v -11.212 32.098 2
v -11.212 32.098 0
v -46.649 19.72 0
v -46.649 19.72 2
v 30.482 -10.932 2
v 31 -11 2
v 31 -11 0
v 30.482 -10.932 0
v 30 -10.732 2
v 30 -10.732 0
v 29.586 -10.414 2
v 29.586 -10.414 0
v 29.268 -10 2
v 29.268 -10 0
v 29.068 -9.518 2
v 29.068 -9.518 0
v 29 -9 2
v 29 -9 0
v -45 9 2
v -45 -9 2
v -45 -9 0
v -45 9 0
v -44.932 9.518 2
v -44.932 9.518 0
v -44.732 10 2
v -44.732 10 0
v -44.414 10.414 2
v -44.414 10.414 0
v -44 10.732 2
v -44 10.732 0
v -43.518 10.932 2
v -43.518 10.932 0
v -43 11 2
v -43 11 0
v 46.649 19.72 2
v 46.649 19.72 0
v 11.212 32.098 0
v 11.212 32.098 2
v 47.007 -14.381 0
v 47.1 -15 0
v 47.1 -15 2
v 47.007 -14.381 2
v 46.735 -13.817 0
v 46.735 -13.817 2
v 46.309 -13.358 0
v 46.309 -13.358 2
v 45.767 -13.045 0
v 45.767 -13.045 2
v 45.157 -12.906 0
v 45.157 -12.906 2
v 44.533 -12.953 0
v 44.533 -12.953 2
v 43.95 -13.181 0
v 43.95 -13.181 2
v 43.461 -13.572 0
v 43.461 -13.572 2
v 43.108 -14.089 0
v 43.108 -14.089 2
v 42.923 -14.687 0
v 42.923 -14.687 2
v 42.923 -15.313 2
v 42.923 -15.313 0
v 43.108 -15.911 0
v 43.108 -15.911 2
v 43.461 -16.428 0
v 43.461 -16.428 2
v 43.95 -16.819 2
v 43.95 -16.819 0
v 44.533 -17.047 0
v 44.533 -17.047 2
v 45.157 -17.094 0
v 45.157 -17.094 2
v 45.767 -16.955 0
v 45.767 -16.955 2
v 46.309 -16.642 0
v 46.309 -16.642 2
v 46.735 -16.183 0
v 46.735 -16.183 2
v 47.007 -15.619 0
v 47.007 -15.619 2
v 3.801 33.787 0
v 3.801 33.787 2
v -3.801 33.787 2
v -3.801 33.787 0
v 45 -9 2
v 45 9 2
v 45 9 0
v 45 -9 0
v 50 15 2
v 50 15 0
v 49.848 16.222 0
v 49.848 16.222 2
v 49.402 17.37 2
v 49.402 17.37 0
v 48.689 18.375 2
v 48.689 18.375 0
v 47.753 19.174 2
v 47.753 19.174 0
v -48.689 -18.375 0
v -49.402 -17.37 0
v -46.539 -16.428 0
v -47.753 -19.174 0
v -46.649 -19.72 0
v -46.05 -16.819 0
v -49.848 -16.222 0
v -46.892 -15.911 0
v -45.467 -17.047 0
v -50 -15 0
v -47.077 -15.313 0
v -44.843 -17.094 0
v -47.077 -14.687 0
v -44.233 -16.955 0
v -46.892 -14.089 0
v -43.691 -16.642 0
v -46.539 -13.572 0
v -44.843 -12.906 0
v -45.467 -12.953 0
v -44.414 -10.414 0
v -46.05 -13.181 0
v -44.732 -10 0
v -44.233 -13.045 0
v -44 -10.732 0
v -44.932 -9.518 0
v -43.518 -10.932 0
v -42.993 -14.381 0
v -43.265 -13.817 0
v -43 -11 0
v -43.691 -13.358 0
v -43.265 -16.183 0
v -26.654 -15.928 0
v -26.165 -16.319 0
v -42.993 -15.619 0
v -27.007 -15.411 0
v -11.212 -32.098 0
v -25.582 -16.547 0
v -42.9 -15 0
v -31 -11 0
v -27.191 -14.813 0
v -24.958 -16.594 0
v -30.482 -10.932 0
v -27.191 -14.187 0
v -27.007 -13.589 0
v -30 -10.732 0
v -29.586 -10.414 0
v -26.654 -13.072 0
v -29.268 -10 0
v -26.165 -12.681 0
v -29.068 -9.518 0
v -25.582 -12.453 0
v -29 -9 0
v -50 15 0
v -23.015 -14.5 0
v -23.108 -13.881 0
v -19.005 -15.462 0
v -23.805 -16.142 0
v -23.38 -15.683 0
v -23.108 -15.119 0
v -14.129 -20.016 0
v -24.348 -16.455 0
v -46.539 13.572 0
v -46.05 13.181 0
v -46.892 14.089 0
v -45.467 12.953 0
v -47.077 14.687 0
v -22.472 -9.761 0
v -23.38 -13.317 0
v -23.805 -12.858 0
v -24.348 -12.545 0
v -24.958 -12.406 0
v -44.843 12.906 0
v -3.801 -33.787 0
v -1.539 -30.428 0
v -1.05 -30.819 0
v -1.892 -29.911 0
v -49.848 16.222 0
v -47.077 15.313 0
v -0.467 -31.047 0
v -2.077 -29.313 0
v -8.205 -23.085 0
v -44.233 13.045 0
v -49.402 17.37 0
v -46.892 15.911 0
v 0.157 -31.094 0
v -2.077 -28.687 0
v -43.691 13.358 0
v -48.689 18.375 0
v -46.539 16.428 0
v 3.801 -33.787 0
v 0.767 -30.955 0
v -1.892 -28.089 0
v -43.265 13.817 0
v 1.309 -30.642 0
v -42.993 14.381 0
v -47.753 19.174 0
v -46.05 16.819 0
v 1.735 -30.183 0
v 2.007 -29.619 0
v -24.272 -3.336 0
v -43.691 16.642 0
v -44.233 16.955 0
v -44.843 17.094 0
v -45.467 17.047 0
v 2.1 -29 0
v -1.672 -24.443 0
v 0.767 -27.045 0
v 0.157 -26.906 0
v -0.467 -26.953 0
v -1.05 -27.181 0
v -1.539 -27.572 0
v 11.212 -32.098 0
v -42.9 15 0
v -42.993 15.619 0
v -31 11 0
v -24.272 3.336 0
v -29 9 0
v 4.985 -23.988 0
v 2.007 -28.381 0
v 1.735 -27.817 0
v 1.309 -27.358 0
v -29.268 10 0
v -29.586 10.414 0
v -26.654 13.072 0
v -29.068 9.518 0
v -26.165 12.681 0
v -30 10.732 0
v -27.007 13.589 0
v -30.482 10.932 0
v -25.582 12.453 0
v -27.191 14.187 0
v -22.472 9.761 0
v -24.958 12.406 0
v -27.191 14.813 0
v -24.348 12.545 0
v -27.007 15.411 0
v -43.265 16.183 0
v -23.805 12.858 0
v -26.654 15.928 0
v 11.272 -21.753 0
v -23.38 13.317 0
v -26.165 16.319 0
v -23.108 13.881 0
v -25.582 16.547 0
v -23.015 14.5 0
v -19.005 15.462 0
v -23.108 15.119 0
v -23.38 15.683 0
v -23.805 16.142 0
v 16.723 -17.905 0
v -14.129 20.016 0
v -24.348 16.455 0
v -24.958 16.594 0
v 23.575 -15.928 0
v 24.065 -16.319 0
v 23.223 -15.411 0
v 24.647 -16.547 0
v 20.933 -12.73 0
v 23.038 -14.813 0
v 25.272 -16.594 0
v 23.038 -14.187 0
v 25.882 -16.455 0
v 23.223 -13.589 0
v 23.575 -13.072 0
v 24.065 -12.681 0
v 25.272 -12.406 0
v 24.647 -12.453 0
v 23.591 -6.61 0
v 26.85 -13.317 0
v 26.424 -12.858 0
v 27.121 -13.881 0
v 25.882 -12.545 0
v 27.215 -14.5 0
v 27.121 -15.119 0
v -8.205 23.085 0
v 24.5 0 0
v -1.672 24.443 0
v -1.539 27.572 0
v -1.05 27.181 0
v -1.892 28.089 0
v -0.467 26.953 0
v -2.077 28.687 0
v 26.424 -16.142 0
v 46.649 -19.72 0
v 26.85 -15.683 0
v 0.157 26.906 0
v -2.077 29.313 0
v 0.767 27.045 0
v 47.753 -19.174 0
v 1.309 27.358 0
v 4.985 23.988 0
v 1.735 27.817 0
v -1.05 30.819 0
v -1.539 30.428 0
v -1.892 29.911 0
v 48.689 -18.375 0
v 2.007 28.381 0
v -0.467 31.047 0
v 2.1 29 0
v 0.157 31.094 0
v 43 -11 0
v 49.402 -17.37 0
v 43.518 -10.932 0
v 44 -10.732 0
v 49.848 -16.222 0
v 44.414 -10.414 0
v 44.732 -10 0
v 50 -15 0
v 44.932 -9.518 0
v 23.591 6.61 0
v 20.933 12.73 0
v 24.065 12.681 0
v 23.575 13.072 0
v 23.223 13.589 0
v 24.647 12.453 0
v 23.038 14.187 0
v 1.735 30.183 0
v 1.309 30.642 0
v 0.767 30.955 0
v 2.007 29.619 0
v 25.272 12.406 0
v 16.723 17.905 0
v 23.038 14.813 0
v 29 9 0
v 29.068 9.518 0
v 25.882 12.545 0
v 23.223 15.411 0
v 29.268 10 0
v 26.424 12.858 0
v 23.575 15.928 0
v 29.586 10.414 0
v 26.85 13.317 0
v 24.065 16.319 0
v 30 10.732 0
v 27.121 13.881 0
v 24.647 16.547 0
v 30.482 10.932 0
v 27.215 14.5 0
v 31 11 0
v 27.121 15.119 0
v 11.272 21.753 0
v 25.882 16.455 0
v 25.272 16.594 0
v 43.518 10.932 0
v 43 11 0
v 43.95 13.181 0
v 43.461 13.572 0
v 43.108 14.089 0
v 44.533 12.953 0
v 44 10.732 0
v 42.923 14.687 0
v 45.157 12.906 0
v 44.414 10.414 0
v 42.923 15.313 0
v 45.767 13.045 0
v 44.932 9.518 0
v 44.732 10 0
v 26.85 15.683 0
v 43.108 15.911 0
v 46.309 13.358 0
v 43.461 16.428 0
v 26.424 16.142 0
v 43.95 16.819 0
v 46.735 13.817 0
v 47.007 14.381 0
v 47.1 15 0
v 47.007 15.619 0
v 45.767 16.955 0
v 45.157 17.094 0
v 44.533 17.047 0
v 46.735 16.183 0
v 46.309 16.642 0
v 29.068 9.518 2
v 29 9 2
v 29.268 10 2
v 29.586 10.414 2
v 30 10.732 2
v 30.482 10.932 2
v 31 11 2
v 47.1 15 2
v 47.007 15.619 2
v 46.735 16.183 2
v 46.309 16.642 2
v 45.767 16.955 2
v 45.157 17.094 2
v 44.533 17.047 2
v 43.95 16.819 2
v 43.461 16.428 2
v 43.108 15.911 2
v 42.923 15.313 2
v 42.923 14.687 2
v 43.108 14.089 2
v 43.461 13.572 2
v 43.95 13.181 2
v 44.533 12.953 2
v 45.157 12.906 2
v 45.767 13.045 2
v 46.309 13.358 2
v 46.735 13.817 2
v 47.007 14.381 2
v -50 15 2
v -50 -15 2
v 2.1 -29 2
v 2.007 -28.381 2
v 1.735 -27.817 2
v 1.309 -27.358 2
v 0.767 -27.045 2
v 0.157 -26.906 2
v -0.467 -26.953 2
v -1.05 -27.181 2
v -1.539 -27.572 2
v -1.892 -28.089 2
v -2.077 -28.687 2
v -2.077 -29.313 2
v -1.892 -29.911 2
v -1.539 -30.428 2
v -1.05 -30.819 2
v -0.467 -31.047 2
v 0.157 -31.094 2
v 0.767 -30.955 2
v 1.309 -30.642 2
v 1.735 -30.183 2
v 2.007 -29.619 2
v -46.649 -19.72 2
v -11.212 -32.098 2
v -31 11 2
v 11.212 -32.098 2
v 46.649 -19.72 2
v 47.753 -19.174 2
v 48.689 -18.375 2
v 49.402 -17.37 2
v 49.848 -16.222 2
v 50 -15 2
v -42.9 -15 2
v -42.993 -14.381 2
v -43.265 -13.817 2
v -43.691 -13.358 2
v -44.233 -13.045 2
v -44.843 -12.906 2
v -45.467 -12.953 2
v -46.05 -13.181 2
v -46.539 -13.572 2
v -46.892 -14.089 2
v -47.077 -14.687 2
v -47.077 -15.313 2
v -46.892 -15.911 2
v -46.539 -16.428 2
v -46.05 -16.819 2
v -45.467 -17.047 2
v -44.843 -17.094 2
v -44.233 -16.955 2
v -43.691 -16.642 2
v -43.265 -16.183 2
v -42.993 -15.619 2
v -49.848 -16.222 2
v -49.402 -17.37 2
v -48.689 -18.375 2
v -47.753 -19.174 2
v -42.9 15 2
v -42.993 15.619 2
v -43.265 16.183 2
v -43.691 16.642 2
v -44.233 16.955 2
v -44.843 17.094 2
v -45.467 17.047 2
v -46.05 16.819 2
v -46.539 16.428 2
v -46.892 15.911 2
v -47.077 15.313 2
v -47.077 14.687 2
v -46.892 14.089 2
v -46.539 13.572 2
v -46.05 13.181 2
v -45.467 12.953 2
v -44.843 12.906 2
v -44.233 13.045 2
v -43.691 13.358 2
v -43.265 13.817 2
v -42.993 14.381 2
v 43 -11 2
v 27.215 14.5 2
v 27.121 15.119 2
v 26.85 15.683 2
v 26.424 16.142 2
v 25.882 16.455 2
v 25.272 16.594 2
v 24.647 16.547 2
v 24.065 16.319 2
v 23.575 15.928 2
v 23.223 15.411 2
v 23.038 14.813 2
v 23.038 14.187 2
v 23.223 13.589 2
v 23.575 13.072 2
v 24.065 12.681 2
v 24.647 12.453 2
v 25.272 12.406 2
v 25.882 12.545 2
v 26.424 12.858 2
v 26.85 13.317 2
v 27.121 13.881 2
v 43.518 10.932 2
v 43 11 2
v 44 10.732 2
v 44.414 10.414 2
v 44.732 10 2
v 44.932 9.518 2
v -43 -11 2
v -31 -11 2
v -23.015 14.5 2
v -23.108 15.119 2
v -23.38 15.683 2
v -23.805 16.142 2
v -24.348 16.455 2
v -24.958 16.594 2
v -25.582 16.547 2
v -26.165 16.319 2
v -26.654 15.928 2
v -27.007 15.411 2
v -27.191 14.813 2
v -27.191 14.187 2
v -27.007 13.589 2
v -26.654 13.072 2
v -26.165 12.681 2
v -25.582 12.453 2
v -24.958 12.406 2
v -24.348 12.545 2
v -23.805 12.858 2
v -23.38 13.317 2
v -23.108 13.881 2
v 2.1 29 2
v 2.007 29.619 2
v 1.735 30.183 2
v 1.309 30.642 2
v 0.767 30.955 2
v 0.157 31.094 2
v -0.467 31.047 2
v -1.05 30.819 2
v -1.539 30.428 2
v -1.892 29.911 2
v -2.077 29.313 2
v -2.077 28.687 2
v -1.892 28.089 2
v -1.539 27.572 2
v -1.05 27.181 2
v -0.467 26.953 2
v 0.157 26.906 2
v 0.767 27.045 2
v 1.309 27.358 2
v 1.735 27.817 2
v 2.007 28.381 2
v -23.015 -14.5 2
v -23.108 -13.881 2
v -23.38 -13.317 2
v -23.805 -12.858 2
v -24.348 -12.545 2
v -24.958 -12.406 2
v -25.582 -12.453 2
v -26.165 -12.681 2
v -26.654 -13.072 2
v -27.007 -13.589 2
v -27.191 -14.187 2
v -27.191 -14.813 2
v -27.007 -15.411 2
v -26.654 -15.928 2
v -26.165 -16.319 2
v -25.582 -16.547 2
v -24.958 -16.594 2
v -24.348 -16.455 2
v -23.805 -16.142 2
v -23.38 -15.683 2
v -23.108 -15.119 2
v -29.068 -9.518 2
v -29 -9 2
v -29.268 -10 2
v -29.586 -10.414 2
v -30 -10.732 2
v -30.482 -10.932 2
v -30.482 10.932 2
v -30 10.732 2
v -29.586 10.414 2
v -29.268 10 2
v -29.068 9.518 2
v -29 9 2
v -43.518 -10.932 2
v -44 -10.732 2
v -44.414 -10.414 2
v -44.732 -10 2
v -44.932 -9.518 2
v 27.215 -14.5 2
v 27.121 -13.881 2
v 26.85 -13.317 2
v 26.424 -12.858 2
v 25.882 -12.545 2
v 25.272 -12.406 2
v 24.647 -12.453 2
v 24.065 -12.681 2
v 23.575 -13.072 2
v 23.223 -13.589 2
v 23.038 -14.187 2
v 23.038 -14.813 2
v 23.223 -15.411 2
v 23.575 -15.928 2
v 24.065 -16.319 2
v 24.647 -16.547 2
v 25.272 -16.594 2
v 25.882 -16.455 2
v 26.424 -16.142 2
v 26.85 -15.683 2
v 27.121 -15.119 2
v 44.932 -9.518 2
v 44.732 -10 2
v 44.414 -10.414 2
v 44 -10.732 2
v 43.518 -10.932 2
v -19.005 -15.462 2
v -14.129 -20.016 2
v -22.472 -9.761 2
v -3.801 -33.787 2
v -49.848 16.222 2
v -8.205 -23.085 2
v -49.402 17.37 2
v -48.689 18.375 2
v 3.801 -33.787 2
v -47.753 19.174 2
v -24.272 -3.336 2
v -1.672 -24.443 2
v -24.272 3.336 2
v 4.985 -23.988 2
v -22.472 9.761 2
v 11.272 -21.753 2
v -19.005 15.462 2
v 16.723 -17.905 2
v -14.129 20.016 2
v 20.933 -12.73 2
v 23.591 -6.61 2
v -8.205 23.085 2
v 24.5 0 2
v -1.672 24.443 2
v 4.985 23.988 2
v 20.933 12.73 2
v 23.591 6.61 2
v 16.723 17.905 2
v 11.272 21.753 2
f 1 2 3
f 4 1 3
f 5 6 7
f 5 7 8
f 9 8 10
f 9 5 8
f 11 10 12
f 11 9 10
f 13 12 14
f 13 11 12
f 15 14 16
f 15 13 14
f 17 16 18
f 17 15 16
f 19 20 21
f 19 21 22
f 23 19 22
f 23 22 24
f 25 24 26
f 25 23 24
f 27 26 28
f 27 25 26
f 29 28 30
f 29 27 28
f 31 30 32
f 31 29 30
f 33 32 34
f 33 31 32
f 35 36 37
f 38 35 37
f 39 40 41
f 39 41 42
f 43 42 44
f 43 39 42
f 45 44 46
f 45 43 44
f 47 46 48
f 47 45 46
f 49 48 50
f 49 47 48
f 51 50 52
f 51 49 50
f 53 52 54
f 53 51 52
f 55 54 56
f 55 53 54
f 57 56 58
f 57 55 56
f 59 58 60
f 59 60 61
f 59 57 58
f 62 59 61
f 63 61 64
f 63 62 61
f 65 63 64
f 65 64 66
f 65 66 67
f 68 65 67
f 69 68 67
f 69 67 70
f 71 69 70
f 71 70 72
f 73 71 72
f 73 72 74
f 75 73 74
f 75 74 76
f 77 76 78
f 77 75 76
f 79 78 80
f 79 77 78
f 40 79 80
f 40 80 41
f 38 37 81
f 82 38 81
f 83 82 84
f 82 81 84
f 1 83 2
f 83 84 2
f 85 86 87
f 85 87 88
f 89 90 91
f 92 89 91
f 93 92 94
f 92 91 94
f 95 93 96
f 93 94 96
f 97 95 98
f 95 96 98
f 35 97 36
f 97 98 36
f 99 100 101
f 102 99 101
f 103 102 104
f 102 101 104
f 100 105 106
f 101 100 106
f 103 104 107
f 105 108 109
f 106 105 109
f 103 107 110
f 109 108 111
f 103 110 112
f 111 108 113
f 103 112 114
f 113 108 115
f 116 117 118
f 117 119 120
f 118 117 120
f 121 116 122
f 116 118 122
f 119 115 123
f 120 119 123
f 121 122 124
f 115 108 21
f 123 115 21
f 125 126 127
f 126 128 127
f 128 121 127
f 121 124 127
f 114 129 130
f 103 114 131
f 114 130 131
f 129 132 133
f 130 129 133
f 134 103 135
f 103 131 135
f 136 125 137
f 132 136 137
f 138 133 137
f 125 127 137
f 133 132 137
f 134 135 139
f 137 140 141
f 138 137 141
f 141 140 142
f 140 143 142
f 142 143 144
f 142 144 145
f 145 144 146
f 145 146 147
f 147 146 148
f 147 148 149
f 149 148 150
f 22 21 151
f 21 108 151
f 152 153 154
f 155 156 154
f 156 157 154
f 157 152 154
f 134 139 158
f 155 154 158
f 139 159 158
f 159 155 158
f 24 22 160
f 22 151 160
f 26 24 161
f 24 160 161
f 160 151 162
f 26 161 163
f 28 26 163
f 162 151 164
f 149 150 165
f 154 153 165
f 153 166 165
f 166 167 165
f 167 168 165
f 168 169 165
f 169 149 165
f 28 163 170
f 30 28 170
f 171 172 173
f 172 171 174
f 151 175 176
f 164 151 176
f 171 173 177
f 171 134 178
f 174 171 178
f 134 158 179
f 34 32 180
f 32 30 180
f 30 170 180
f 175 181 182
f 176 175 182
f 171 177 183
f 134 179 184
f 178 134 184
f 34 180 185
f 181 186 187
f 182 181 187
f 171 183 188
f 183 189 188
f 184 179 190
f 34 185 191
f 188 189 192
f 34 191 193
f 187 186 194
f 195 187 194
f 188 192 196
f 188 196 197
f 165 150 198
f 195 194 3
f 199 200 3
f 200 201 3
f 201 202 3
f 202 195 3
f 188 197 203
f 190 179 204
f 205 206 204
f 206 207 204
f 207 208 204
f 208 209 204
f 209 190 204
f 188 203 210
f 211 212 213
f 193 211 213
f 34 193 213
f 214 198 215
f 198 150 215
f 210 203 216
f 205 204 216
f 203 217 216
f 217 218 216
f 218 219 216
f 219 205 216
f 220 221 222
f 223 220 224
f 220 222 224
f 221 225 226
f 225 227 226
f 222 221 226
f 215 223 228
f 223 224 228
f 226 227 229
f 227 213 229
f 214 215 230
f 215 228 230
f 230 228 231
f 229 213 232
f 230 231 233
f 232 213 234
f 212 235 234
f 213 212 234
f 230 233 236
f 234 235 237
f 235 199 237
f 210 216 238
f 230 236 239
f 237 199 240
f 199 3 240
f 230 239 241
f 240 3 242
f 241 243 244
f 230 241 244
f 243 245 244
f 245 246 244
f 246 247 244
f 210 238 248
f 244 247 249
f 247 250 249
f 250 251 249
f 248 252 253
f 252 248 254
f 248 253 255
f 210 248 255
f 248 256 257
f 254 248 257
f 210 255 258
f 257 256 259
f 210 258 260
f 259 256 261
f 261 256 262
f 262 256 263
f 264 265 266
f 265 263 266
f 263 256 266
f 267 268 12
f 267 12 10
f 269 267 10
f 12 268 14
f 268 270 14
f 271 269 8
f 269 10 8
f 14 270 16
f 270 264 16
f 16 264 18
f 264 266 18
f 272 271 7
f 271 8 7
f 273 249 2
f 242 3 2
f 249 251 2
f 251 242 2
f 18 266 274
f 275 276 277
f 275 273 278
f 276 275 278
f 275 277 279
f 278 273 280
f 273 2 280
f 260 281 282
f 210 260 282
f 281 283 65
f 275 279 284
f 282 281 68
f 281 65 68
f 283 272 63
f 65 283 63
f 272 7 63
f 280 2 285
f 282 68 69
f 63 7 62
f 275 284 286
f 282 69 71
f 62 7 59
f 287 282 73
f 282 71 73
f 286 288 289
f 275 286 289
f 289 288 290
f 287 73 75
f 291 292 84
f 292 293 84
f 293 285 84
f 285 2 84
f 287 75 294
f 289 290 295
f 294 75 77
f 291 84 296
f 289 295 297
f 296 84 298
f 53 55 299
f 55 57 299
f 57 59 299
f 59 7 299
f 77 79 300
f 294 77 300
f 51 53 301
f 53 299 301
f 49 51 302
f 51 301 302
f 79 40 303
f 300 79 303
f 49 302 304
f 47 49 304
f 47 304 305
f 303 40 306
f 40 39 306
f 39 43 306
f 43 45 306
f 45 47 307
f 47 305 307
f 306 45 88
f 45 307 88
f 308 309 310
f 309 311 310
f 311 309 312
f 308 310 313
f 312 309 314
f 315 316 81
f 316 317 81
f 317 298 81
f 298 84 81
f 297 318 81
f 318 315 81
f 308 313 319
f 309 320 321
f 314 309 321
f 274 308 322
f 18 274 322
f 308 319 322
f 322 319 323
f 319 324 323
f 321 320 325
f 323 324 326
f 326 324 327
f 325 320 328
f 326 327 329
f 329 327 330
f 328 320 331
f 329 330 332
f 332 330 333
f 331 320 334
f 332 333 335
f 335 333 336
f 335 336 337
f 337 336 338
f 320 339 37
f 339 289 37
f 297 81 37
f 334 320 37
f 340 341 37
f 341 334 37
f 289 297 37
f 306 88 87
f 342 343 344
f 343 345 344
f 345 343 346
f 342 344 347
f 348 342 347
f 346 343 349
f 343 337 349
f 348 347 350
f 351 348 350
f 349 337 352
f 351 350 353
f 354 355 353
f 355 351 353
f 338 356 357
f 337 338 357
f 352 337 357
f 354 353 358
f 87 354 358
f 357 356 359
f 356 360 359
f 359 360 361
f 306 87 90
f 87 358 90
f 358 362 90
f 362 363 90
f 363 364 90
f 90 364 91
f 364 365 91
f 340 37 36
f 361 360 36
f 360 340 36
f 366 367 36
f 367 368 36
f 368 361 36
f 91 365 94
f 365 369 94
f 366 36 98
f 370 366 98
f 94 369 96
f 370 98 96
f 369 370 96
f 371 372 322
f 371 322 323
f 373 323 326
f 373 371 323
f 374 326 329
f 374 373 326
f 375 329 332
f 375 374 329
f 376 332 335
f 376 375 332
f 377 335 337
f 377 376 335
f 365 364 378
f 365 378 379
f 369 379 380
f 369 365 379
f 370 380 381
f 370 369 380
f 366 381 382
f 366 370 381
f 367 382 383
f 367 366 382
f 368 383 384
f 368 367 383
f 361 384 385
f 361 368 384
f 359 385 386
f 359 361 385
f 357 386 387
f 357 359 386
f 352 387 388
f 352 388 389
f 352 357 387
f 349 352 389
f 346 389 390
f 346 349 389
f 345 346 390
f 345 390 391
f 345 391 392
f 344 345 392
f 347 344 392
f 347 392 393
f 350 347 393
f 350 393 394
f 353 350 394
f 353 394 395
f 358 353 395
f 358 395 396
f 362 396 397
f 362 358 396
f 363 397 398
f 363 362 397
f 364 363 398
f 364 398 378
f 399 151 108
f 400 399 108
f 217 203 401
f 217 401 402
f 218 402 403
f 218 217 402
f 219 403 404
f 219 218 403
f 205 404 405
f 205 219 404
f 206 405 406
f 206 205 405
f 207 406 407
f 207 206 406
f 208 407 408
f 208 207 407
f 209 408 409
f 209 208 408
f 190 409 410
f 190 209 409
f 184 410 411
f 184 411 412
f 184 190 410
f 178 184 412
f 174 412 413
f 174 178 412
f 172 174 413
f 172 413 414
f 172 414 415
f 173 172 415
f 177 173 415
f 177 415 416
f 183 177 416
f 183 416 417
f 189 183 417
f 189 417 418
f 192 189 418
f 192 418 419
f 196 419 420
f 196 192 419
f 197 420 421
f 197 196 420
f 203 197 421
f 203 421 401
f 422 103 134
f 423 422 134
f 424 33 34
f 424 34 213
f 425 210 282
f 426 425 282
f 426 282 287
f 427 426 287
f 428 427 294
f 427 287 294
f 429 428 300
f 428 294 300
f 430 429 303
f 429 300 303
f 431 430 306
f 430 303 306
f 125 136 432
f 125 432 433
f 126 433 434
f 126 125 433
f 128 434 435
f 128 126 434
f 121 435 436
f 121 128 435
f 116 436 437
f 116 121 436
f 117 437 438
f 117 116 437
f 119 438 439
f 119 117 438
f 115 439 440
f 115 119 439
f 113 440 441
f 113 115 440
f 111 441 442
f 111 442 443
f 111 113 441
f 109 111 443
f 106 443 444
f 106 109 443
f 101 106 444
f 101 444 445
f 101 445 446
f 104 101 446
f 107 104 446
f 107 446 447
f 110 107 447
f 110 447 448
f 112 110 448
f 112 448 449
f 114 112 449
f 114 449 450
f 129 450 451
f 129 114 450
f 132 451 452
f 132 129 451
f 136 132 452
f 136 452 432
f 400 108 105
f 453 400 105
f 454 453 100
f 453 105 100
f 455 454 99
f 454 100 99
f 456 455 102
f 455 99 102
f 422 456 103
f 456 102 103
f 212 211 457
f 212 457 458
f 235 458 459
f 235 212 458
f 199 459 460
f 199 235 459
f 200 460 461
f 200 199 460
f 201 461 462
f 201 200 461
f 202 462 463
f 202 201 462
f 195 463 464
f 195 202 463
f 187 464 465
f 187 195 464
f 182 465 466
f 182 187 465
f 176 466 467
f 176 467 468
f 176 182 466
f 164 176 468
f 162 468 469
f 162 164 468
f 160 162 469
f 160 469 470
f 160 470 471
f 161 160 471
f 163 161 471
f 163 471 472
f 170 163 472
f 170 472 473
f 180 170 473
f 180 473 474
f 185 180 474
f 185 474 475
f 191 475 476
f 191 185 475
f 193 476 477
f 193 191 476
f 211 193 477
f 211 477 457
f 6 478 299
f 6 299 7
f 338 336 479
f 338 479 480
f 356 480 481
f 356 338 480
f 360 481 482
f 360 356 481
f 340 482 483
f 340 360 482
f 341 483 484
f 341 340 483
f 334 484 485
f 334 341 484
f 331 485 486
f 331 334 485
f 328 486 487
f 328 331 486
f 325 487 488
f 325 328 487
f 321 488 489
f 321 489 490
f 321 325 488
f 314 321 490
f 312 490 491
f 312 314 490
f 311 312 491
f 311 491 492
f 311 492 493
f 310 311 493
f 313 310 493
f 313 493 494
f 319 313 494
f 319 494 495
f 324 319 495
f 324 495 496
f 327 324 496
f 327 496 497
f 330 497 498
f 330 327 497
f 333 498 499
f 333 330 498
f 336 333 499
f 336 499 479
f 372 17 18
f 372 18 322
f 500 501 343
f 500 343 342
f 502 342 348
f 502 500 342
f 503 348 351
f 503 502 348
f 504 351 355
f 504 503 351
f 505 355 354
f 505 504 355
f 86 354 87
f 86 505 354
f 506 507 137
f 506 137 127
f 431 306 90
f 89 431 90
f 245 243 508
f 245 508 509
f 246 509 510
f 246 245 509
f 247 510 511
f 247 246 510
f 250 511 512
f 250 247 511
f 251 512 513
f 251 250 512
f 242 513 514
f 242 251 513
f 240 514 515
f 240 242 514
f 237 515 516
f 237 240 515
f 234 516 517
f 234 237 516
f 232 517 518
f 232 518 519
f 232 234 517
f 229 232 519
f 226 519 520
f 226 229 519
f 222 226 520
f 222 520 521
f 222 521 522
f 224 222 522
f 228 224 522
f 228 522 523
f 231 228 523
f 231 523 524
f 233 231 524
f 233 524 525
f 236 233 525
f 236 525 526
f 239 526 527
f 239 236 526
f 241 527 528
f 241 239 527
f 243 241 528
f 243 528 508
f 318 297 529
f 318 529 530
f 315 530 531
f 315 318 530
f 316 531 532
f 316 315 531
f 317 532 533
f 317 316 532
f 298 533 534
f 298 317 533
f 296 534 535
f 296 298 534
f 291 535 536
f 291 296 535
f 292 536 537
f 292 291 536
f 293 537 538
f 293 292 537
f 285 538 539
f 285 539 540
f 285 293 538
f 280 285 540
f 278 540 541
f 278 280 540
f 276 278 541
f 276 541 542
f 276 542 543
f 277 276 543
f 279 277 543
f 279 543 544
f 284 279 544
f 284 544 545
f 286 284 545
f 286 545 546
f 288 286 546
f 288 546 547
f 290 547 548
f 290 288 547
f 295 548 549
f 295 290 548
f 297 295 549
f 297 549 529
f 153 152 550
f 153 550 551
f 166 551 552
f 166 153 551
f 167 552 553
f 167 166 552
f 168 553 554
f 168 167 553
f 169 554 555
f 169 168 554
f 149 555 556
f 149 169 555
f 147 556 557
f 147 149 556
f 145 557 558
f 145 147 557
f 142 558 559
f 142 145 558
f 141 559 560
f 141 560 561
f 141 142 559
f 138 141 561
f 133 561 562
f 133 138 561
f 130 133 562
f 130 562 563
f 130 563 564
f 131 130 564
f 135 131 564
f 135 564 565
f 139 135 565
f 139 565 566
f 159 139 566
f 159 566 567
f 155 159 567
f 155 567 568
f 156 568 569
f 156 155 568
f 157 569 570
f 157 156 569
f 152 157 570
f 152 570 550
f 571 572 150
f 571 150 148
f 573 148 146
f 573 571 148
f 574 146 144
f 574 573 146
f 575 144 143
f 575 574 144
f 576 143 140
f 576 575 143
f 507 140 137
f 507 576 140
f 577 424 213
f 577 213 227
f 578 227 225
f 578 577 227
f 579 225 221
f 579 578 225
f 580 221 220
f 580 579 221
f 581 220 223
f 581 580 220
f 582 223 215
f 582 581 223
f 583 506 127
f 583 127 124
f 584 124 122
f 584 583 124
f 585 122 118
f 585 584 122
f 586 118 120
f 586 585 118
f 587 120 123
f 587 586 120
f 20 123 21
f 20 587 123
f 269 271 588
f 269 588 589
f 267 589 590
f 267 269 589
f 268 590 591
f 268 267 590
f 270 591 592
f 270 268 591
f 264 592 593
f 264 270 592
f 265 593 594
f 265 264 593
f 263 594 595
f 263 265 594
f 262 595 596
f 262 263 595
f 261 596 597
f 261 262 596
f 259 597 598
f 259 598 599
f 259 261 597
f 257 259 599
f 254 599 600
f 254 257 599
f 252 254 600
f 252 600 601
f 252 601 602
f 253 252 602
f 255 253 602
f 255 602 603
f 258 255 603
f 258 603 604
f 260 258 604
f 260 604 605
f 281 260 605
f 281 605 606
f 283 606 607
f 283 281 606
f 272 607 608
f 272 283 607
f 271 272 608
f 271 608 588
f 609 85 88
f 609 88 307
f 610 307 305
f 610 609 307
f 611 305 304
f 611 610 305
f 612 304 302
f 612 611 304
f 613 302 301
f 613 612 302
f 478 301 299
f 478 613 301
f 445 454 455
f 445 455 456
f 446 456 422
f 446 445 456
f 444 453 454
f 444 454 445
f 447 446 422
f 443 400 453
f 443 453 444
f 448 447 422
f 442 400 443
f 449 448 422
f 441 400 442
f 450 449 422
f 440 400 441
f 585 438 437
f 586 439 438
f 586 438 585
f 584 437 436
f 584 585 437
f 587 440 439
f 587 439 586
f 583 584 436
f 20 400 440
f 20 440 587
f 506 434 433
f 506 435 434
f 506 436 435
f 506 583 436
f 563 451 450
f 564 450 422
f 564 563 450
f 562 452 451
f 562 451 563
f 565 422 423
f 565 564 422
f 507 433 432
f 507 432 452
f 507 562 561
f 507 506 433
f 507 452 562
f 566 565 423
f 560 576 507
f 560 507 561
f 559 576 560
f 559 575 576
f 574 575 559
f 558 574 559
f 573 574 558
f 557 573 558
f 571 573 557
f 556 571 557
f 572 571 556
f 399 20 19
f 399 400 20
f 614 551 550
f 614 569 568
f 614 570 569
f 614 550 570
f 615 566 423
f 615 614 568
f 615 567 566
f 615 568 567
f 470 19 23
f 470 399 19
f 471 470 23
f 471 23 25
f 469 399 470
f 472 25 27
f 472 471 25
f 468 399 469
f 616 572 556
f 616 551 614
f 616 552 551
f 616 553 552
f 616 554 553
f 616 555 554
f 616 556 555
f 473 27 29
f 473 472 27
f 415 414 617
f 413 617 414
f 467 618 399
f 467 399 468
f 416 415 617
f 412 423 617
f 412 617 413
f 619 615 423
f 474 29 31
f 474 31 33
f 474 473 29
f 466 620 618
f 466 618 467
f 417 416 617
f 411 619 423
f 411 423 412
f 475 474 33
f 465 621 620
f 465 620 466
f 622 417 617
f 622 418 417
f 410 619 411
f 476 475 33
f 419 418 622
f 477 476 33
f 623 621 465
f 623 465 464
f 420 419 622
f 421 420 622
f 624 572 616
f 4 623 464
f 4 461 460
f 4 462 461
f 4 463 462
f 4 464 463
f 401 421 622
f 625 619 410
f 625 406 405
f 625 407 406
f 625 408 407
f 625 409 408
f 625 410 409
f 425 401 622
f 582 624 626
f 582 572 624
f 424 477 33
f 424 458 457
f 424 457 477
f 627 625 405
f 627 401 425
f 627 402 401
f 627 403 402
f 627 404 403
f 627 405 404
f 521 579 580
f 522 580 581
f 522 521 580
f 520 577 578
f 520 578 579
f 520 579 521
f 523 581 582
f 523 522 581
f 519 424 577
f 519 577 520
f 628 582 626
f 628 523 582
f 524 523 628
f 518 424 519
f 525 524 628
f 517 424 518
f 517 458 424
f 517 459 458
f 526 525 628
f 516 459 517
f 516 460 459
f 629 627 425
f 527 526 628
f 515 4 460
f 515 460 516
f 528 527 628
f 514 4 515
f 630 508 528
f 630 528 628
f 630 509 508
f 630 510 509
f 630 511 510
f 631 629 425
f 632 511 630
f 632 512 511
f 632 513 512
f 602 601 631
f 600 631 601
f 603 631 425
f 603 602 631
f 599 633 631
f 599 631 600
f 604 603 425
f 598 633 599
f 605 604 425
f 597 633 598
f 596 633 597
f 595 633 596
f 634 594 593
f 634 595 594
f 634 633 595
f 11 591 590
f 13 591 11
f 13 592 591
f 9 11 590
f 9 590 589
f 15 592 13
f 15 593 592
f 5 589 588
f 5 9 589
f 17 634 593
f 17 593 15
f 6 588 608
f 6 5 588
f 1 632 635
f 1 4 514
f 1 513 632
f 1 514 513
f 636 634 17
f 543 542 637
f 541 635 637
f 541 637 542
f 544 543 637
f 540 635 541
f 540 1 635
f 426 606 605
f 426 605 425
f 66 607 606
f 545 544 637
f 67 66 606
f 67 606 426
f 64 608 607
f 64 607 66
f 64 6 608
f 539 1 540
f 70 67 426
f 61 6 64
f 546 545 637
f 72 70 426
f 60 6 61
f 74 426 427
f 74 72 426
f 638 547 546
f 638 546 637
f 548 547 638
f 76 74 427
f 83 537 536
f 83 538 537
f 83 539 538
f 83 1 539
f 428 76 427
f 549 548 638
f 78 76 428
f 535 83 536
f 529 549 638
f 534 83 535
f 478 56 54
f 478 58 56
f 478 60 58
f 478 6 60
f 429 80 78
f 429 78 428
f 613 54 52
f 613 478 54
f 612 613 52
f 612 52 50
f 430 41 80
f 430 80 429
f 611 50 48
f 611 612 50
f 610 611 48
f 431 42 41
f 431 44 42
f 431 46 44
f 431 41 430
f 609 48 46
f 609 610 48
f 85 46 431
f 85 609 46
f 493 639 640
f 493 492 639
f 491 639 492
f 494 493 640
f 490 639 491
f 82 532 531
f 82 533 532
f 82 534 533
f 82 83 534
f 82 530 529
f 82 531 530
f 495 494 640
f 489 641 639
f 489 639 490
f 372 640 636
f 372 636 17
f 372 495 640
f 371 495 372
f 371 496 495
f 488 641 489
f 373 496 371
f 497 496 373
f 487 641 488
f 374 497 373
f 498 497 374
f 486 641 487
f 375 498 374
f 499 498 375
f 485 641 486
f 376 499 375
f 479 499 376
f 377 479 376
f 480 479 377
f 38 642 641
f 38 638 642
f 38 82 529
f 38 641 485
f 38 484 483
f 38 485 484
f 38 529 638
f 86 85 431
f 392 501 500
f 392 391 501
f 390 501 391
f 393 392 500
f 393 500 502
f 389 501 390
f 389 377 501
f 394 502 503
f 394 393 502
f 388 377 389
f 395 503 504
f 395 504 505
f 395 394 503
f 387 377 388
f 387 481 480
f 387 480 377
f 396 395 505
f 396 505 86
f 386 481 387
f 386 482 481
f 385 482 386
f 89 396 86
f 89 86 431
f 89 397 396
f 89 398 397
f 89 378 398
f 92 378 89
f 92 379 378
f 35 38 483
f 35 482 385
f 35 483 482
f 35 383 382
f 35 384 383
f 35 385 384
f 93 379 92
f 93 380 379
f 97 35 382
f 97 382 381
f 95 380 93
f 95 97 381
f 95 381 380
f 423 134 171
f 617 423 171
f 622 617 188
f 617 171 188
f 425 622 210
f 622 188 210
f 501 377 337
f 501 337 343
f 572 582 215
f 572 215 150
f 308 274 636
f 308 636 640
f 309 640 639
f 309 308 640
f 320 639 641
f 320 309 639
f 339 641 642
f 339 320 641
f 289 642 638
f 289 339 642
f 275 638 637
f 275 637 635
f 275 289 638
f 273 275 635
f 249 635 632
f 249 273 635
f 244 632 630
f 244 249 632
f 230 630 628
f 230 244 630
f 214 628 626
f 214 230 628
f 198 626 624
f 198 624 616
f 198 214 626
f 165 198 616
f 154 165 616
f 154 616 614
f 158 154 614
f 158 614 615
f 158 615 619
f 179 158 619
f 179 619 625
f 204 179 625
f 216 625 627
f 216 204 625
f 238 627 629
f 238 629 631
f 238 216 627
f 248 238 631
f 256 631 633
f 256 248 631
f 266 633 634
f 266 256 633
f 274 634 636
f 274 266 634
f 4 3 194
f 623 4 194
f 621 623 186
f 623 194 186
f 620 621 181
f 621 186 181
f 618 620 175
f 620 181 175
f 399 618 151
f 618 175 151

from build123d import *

# Parameters (mm, degrees)
SKETCH_1_R          = 24.5
SKETCH_1_R_2        = 2.1
EXTRUDE_1_DEPTH     = 2
CUT_EXTRUDE_1_DEPTH = 10


with BuildPart() as part:
    # 草图1 → 凸台-拉伸1 (new body)
    with BuildSketch(Plane.XY):
        with BuildLine():
            Line((-50, 15), (-50, -15))
            ThreePointArc((-50, -15), (-49.077002077, -17.894486839), (-46.648778375, -19.720331542))
            Line((-46.648778375, -19.720331542), (-11.211692948, -32.098254489))
            ThreePointArc((-11.211692948, -32.098254489), (0, -34), (11.211692948, -32.098254489))
            Line((11.211692948, -32.098254489), (46.648778375, -19.720331542))
            ThreePointArc((46.648778375, -19.720331542), (49.077002077, -17.894486839), (50, -15))
            Line((50, -15), (50, 15))
            ThreePointArc((50, 15), (49.077002077, 17.894486839), (46.648778375, 19.720331542))
            Line((46.648778375, 19.720331542), (11.211692948, 32.098254489))
            ThreePointArc((11.211692948, 32.098254489), (0, 34), (-11.211692948, 32.098254489))
            Line((-11.211692948, 32.098254489), (-46.648778375, 19.720331542))
            ThreePointArc((-46.648778375, 19.720331542), (-49.077002077, 17.894486839), (-50, 15))
        make_face()
        Circle(SKETCH_1_R, mode=Mode.SUBTRACT)
        with Locations((0, 29)):
            Circle(SKETCH_1_R_2, mode=Mode.SUBTRACT)
        with Locations((25.11473671, 14.5)):
            Circle(SKETCH_1_R_2, mode=Mode.SUBTRACT)
        with Locations((25.11473671, -14.5)):
            Circle(SKETCH_1_R_2, mode=Mode.SUBTRACT)
        with Locations((0, -29)):
            Circle(SKETCH_1_R_2, mode=Mode.SUBTRACT)
        with Locations((-25.11473671, -14.5)):
            Circle(SKETCH_1_R_2, mode=Mode.SUBTRACT)
        with Locations((-25.11473671, 14.5)):
            Circle(SKETCH_1_R_2, mode=Mode.SUBTRACT)
        with Locations((-45, 15)):
            Circle(SKETCH_1_R_2, mode=Mode.SUBTRACT)
        with Locations((-45, -15)):
            Circle(SKETCH_1_R_2, mode=Mode.SUBTRACT)
        with Locations((45, -15)):
            Circle(SKETCH_1_R_2, mode=Mode.SUBTRACT)
        with Locations((45, 15)):
            Circle(SKETCH_1_R_2, mode=Mode.SUBTRACT)
    extrude(amount=EXTRUDE_1_DEPTH)

    # 草图2 → 切除-拉伸1 (cut)
    with BuildSketch(Plane.XY.offset(2)):
        with BuildLine():
            Line((-43, 11), (-31, 11))
            ThreePointArc((-31, 11), (-29.585786438, 10.414213562), (-29, 9))
            Line((-29, 9), (-29, -9))
            ThreePointArc((-29, -9), (-29.585786438, -10.414213562), (-31, -11))
            Line((-31, -11), (-43, -11))
            ThreePointArc((-43, -11), (-44.414213562, -10.414213562), (-45, -9))
            Line((-45, -9), (-45, 9))
            ThreePointArc((-45, 9), (-44.414213562, 10.414213562), (-43, 11))
        make_face()
        with BuildLine():
            Line((31, 11), (43, 11))
            ThreePointArc((43, 11), (44.414213562, 10.414213562), (45, 9))
            Line((45, 9), (45, -9))
            ThreePointArc((45, -9), (44.414213562, -10.414213562), (43, -11))
            Line((43, -11), (31, -11))
            ThreePointArc((31, -11), (29.585786438, -10.414213562), (29, -9))
            Line((29, -9), (29, 9))
            ThreePointArc((29, 9), (29.585786438, 10.414213562), (31, 11))
        make_face()
    extrude(amount=-CUT_EXTRUDE_1_DEPTH, mode=Mode.SUBTRACT)


solid = part.part
